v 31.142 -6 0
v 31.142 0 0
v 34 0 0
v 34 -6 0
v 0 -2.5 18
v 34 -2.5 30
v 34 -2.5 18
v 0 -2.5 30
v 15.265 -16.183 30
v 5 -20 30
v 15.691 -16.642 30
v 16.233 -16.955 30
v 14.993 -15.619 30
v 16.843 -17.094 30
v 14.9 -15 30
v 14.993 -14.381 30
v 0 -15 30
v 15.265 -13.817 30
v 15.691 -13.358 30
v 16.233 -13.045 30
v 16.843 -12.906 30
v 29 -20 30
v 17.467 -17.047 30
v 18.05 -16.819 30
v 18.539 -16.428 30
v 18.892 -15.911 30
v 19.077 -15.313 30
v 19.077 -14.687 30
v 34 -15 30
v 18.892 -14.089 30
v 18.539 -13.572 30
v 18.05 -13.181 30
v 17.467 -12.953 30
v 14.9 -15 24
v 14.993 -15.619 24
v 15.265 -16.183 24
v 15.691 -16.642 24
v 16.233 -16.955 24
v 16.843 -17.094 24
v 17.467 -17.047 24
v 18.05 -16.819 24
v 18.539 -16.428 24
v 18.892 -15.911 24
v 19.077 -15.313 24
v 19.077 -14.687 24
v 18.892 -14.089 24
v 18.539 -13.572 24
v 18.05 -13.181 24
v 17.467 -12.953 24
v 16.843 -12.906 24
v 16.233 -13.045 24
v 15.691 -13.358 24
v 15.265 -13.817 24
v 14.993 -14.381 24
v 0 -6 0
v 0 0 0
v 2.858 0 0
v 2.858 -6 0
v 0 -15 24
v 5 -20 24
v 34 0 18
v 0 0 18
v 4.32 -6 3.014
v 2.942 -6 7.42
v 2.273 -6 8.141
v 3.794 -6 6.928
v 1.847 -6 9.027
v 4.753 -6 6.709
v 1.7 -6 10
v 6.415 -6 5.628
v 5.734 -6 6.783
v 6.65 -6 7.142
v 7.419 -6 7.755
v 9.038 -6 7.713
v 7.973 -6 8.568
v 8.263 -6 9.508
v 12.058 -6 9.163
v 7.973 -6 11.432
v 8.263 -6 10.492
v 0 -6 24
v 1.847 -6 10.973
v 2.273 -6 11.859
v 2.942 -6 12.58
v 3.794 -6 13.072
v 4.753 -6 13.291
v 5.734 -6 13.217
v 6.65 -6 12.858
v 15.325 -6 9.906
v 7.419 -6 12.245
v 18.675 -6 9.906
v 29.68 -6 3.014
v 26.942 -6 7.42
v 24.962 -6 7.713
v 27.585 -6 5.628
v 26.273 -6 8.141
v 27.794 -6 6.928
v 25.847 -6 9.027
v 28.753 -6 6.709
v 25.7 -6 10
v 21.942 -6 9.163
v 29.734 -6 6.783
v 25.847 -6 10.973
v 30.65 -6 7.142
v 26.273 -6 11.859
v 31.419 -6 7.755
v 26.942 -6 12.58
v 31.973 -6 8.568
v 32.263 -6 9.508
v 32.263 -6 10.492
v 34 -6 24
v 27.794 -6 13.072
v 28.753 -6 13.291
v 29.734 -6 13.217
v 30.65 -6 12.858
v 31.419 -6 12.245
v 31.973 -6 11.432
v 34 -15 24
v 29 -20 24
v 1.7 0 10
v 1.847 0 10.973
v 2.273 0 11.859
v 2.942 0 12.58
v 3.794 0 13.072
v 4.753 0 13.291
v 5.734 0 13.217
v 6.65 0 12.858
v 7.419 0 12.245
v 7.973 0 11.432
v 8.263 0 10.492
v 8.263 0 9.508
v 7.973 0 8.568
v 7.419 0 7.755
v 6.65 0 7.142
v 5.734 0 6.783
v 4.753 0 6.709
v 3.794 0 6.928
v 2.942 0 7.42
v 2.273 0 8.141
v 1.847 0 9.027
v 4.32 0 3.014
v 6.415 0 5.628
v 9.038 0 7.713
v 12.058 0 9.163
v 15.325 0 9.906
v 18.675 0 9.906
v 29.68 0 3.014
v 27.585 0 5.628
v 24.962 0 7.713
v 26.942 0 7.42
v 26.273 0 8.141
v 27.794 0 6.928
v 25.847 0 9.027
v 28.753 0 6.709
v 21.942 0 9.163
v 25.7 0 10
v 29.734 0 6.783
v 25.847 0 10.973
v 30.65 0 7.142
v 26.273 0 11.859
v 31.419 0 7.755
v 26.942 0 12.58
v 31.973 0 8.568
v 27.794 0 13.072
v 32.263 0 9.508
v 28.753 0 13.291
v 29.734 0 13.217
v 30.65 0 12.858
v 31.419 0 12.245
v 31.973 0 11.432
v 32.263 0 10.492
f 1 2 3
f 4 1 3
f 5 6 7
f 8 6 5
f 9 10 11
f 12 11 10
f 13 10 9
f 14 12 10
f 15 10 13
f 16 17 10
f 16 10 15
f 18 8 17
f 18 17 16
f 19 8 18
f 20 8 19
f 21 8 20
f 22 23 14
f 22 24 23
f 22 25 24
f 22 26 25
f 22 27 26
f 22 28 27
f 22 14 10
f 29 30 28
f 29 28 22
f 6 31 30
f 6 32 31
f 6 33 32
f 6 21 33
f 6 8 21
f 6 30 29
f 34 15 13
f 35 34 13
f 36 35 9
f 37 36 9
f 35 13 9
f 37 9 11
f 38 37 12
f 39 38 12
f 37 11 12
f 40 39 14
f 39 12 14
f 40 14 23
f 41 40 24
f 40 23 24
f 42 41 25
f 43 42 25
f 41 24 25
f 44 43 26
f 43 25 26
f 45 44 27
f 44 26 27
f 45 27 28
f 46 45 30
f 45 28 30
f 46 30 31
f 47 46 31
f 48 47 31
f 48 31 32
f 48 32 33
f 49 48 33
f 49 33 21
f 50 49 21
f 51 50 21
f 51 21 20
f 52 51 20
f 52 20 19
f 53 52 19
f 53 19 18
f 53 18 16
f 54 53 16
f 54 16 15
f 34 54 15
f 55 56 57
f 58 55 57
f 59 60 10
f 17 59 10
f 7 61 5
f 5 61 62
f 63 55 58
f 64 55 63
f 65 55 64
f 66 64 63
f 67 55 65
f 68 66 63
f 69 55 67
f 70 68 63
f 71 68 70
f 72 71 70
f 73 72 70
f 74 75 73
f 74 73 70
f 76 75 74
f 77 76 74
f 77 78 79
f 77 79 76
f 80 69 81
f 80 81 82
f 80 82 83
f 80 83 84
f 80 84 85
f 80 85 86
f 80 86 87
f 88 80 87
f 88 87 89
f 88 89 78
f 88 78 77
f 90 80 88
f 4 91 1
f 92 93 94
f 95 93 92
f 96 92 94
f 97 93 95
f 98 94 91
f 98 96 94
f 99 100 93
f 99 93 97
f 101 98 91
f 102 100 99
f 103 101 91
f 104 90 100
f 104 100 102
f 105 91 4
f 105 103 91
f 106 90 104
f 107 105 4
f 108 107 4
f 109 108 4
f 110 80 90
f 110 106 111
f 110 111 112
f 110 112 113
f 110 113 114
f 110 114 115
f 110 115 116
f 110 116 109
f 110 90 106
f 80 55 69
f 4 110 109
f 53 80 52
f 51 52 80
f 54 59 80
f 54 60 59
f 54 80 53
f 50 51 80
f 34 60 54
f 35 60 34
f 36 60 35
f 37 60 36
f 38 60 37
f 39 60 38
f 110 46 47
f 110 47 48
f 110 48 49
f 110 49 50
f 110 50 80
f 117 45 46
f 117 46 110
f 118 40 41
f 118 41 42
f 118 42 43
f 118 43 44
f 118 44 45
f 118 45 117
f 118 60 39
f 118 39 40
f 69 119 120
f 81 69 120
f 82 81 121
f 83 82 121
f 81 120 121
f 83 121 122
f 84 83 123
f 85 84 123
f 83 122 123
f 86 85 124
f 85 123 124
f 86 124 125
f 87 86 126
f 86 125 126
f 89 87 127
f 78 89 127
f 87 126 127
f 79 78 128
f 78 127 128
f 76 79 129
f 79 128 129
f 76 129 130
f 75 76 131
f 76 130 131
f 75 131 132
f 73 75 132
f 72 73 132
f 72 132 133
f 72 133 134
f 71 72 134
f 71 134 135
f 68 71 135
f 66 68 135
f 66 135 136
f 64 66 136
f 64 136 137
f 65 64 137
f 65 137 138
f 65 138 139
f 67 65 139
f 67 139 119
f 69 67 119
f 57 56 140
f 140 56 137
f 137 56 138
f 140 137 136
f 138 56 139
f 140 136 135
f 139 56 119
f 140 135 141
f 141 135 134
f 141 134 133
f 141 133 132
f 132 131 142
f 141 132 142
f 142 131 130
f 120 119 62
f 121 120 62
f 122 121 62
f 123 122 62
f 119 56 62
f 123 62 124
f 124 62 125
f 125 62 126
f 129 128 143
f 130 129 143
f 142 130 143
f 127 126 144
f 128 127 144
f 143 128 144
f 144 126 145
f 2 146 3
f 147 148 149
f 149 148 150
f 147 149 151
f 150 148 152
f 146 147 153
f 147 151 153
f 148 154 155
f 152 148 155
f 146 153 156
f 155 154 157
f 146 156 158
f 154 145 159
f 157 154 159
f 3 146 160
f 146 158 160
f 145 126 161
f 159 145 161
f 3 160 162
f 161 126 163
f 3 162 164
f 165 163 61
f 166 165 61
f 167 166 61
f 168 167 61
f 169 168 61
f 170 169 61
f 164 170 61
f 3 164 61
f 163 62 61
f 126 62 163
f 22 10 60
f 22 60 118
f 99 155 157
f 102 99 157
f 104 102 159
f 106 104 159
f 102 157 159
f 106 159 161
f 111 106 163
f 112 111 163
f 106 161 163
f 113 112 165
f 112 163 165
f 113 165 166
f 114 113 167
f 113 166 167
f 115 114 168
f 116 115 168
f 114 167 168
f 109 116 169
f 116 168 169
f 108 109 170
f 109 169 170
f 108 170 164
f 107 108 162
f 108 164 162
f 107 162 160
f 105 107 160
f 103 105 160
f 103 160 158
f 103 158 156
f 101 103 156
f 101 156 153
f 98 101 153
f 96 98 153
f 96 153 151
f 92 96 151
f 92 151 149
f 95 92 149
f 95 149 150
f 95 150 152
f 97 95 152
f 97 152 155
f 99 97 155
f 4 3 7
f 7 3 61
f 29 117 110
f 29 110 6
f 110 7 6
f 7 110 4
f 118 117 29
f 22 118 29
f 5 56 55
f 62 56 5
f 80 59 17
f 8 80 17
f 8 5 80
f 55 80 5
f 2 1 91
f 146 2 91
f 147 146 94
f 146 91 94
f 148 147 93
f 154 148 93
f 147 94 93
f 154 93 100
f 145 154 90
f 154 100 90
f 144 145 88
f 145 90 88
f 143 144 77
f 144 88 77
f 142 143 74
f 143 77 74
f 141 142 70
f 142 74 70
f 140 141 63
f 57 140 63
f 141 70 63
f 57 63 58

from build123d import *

# Parameters (mm, degrees)
F0_W      = 34
F0_H      = 30
F1_DEPTH  = 20
F2_W      = 34
F2_H      = 24
F3_DEPTH  = 14
F5_D      = 4.2
F5_DEPTH  = 20
F5_TIP    = 1.2618073
F6_SIZE   = 5
F8_DEPTH  = 25
F9_D      = 6.6
F9_DEPTH  = 20
F9_TIP    = 1.9828400428
F10_W     = 34
F10_H     = 12
F11_DEPTH = 2.5


with BuildPart() as f1:
    # F0 (on Front) → F1 (new body)
    with BuildSketch(Plane.XZ):
        with Locations((17, 15)):
            Rectangle(F0_W, F0_H)
    extrude(amount=F1_DEPTH)

    # F2 (on face) → F3 (cut)
    with BuildSketch(Plane.XZ.offset(20)):
        with Locations((17, 12)):
            Rectangle(F2_W, F2_H)
    extrude(amount=-F3_DEPTH, mode=Mode.SUBTRACT)

    # F5
    with Locations(Plane(origin=(0, 0, 24), x_dir=(1, 0, 0), z_dir=(0, 0, -1))):
        with Locations((17, 15)):
            Hole(F5_D / 2, depth=F5_DEPTH)
            with Locations((0, 0, -(F5_DEPTH + F5_TIP / 2))):  # 118° drill point
                Cone(0, F5_D / 2, F5_TIP, mode=Mode.SUBTRACT)

    # F6
    f6_edges = [f1.edges().sort_by_distance(p)[0] for p in [
        (34, -20, 27),
        (0, -20, 27),
    ]]
    chamfer(f6_edges, length=F6_SIZE)

    # F7 (on face) → F8 (cut)
    with BuildSketch(Plane.XZ.offset(6)):
        with BuildLine():
            ThreePointArc((2.8578643763, 0), (14.4634703191, -19.7839783948), (32, -5))
            ThreePointArc((32, -5), (31.7839783948, -2.4634703191), (31.1421356237, 0))
            Line((31.1421356237, 0), (2.8578643763, 0))
        make_face()
        with BuildLine():
            Line((2.8578643763, 0), (31.1421356237, 0))
            ThreePointArc((31.1421356237, 0), (17, 10), (2.8578643763, 0))
        make_face()
    extrude(amount=-F8_DEPTH, mode=Mode.SUBTRACT)

    # F9
    with Locations(Plane.XZ.offset(6)):
        with Locations((5, 10), (29, 10)):
            Hole(F9_D / 2, depth=F9_DEPTH)
            with Locations((0, 0, -(F9_DEPTH + F9_TIP / 2))):  # 118° drill point
                Cone(0, F9_D / 2, F9_TIP, mode=Mode.SUBTRACT)

    # F10 (on face) → F11 (cut)
    with BuildSketch(Plane(origin=(0, 0, 0), x_dir=(-1, 0, 0), z_dir=(0, 1, 0))):
        with Locations((-17, 24)):
            Rectangle(F10_W, F10_H)
    extrude(amount=-F11_DEPTH, mode=Mode.SUBTRACT)


solid = f1.part
